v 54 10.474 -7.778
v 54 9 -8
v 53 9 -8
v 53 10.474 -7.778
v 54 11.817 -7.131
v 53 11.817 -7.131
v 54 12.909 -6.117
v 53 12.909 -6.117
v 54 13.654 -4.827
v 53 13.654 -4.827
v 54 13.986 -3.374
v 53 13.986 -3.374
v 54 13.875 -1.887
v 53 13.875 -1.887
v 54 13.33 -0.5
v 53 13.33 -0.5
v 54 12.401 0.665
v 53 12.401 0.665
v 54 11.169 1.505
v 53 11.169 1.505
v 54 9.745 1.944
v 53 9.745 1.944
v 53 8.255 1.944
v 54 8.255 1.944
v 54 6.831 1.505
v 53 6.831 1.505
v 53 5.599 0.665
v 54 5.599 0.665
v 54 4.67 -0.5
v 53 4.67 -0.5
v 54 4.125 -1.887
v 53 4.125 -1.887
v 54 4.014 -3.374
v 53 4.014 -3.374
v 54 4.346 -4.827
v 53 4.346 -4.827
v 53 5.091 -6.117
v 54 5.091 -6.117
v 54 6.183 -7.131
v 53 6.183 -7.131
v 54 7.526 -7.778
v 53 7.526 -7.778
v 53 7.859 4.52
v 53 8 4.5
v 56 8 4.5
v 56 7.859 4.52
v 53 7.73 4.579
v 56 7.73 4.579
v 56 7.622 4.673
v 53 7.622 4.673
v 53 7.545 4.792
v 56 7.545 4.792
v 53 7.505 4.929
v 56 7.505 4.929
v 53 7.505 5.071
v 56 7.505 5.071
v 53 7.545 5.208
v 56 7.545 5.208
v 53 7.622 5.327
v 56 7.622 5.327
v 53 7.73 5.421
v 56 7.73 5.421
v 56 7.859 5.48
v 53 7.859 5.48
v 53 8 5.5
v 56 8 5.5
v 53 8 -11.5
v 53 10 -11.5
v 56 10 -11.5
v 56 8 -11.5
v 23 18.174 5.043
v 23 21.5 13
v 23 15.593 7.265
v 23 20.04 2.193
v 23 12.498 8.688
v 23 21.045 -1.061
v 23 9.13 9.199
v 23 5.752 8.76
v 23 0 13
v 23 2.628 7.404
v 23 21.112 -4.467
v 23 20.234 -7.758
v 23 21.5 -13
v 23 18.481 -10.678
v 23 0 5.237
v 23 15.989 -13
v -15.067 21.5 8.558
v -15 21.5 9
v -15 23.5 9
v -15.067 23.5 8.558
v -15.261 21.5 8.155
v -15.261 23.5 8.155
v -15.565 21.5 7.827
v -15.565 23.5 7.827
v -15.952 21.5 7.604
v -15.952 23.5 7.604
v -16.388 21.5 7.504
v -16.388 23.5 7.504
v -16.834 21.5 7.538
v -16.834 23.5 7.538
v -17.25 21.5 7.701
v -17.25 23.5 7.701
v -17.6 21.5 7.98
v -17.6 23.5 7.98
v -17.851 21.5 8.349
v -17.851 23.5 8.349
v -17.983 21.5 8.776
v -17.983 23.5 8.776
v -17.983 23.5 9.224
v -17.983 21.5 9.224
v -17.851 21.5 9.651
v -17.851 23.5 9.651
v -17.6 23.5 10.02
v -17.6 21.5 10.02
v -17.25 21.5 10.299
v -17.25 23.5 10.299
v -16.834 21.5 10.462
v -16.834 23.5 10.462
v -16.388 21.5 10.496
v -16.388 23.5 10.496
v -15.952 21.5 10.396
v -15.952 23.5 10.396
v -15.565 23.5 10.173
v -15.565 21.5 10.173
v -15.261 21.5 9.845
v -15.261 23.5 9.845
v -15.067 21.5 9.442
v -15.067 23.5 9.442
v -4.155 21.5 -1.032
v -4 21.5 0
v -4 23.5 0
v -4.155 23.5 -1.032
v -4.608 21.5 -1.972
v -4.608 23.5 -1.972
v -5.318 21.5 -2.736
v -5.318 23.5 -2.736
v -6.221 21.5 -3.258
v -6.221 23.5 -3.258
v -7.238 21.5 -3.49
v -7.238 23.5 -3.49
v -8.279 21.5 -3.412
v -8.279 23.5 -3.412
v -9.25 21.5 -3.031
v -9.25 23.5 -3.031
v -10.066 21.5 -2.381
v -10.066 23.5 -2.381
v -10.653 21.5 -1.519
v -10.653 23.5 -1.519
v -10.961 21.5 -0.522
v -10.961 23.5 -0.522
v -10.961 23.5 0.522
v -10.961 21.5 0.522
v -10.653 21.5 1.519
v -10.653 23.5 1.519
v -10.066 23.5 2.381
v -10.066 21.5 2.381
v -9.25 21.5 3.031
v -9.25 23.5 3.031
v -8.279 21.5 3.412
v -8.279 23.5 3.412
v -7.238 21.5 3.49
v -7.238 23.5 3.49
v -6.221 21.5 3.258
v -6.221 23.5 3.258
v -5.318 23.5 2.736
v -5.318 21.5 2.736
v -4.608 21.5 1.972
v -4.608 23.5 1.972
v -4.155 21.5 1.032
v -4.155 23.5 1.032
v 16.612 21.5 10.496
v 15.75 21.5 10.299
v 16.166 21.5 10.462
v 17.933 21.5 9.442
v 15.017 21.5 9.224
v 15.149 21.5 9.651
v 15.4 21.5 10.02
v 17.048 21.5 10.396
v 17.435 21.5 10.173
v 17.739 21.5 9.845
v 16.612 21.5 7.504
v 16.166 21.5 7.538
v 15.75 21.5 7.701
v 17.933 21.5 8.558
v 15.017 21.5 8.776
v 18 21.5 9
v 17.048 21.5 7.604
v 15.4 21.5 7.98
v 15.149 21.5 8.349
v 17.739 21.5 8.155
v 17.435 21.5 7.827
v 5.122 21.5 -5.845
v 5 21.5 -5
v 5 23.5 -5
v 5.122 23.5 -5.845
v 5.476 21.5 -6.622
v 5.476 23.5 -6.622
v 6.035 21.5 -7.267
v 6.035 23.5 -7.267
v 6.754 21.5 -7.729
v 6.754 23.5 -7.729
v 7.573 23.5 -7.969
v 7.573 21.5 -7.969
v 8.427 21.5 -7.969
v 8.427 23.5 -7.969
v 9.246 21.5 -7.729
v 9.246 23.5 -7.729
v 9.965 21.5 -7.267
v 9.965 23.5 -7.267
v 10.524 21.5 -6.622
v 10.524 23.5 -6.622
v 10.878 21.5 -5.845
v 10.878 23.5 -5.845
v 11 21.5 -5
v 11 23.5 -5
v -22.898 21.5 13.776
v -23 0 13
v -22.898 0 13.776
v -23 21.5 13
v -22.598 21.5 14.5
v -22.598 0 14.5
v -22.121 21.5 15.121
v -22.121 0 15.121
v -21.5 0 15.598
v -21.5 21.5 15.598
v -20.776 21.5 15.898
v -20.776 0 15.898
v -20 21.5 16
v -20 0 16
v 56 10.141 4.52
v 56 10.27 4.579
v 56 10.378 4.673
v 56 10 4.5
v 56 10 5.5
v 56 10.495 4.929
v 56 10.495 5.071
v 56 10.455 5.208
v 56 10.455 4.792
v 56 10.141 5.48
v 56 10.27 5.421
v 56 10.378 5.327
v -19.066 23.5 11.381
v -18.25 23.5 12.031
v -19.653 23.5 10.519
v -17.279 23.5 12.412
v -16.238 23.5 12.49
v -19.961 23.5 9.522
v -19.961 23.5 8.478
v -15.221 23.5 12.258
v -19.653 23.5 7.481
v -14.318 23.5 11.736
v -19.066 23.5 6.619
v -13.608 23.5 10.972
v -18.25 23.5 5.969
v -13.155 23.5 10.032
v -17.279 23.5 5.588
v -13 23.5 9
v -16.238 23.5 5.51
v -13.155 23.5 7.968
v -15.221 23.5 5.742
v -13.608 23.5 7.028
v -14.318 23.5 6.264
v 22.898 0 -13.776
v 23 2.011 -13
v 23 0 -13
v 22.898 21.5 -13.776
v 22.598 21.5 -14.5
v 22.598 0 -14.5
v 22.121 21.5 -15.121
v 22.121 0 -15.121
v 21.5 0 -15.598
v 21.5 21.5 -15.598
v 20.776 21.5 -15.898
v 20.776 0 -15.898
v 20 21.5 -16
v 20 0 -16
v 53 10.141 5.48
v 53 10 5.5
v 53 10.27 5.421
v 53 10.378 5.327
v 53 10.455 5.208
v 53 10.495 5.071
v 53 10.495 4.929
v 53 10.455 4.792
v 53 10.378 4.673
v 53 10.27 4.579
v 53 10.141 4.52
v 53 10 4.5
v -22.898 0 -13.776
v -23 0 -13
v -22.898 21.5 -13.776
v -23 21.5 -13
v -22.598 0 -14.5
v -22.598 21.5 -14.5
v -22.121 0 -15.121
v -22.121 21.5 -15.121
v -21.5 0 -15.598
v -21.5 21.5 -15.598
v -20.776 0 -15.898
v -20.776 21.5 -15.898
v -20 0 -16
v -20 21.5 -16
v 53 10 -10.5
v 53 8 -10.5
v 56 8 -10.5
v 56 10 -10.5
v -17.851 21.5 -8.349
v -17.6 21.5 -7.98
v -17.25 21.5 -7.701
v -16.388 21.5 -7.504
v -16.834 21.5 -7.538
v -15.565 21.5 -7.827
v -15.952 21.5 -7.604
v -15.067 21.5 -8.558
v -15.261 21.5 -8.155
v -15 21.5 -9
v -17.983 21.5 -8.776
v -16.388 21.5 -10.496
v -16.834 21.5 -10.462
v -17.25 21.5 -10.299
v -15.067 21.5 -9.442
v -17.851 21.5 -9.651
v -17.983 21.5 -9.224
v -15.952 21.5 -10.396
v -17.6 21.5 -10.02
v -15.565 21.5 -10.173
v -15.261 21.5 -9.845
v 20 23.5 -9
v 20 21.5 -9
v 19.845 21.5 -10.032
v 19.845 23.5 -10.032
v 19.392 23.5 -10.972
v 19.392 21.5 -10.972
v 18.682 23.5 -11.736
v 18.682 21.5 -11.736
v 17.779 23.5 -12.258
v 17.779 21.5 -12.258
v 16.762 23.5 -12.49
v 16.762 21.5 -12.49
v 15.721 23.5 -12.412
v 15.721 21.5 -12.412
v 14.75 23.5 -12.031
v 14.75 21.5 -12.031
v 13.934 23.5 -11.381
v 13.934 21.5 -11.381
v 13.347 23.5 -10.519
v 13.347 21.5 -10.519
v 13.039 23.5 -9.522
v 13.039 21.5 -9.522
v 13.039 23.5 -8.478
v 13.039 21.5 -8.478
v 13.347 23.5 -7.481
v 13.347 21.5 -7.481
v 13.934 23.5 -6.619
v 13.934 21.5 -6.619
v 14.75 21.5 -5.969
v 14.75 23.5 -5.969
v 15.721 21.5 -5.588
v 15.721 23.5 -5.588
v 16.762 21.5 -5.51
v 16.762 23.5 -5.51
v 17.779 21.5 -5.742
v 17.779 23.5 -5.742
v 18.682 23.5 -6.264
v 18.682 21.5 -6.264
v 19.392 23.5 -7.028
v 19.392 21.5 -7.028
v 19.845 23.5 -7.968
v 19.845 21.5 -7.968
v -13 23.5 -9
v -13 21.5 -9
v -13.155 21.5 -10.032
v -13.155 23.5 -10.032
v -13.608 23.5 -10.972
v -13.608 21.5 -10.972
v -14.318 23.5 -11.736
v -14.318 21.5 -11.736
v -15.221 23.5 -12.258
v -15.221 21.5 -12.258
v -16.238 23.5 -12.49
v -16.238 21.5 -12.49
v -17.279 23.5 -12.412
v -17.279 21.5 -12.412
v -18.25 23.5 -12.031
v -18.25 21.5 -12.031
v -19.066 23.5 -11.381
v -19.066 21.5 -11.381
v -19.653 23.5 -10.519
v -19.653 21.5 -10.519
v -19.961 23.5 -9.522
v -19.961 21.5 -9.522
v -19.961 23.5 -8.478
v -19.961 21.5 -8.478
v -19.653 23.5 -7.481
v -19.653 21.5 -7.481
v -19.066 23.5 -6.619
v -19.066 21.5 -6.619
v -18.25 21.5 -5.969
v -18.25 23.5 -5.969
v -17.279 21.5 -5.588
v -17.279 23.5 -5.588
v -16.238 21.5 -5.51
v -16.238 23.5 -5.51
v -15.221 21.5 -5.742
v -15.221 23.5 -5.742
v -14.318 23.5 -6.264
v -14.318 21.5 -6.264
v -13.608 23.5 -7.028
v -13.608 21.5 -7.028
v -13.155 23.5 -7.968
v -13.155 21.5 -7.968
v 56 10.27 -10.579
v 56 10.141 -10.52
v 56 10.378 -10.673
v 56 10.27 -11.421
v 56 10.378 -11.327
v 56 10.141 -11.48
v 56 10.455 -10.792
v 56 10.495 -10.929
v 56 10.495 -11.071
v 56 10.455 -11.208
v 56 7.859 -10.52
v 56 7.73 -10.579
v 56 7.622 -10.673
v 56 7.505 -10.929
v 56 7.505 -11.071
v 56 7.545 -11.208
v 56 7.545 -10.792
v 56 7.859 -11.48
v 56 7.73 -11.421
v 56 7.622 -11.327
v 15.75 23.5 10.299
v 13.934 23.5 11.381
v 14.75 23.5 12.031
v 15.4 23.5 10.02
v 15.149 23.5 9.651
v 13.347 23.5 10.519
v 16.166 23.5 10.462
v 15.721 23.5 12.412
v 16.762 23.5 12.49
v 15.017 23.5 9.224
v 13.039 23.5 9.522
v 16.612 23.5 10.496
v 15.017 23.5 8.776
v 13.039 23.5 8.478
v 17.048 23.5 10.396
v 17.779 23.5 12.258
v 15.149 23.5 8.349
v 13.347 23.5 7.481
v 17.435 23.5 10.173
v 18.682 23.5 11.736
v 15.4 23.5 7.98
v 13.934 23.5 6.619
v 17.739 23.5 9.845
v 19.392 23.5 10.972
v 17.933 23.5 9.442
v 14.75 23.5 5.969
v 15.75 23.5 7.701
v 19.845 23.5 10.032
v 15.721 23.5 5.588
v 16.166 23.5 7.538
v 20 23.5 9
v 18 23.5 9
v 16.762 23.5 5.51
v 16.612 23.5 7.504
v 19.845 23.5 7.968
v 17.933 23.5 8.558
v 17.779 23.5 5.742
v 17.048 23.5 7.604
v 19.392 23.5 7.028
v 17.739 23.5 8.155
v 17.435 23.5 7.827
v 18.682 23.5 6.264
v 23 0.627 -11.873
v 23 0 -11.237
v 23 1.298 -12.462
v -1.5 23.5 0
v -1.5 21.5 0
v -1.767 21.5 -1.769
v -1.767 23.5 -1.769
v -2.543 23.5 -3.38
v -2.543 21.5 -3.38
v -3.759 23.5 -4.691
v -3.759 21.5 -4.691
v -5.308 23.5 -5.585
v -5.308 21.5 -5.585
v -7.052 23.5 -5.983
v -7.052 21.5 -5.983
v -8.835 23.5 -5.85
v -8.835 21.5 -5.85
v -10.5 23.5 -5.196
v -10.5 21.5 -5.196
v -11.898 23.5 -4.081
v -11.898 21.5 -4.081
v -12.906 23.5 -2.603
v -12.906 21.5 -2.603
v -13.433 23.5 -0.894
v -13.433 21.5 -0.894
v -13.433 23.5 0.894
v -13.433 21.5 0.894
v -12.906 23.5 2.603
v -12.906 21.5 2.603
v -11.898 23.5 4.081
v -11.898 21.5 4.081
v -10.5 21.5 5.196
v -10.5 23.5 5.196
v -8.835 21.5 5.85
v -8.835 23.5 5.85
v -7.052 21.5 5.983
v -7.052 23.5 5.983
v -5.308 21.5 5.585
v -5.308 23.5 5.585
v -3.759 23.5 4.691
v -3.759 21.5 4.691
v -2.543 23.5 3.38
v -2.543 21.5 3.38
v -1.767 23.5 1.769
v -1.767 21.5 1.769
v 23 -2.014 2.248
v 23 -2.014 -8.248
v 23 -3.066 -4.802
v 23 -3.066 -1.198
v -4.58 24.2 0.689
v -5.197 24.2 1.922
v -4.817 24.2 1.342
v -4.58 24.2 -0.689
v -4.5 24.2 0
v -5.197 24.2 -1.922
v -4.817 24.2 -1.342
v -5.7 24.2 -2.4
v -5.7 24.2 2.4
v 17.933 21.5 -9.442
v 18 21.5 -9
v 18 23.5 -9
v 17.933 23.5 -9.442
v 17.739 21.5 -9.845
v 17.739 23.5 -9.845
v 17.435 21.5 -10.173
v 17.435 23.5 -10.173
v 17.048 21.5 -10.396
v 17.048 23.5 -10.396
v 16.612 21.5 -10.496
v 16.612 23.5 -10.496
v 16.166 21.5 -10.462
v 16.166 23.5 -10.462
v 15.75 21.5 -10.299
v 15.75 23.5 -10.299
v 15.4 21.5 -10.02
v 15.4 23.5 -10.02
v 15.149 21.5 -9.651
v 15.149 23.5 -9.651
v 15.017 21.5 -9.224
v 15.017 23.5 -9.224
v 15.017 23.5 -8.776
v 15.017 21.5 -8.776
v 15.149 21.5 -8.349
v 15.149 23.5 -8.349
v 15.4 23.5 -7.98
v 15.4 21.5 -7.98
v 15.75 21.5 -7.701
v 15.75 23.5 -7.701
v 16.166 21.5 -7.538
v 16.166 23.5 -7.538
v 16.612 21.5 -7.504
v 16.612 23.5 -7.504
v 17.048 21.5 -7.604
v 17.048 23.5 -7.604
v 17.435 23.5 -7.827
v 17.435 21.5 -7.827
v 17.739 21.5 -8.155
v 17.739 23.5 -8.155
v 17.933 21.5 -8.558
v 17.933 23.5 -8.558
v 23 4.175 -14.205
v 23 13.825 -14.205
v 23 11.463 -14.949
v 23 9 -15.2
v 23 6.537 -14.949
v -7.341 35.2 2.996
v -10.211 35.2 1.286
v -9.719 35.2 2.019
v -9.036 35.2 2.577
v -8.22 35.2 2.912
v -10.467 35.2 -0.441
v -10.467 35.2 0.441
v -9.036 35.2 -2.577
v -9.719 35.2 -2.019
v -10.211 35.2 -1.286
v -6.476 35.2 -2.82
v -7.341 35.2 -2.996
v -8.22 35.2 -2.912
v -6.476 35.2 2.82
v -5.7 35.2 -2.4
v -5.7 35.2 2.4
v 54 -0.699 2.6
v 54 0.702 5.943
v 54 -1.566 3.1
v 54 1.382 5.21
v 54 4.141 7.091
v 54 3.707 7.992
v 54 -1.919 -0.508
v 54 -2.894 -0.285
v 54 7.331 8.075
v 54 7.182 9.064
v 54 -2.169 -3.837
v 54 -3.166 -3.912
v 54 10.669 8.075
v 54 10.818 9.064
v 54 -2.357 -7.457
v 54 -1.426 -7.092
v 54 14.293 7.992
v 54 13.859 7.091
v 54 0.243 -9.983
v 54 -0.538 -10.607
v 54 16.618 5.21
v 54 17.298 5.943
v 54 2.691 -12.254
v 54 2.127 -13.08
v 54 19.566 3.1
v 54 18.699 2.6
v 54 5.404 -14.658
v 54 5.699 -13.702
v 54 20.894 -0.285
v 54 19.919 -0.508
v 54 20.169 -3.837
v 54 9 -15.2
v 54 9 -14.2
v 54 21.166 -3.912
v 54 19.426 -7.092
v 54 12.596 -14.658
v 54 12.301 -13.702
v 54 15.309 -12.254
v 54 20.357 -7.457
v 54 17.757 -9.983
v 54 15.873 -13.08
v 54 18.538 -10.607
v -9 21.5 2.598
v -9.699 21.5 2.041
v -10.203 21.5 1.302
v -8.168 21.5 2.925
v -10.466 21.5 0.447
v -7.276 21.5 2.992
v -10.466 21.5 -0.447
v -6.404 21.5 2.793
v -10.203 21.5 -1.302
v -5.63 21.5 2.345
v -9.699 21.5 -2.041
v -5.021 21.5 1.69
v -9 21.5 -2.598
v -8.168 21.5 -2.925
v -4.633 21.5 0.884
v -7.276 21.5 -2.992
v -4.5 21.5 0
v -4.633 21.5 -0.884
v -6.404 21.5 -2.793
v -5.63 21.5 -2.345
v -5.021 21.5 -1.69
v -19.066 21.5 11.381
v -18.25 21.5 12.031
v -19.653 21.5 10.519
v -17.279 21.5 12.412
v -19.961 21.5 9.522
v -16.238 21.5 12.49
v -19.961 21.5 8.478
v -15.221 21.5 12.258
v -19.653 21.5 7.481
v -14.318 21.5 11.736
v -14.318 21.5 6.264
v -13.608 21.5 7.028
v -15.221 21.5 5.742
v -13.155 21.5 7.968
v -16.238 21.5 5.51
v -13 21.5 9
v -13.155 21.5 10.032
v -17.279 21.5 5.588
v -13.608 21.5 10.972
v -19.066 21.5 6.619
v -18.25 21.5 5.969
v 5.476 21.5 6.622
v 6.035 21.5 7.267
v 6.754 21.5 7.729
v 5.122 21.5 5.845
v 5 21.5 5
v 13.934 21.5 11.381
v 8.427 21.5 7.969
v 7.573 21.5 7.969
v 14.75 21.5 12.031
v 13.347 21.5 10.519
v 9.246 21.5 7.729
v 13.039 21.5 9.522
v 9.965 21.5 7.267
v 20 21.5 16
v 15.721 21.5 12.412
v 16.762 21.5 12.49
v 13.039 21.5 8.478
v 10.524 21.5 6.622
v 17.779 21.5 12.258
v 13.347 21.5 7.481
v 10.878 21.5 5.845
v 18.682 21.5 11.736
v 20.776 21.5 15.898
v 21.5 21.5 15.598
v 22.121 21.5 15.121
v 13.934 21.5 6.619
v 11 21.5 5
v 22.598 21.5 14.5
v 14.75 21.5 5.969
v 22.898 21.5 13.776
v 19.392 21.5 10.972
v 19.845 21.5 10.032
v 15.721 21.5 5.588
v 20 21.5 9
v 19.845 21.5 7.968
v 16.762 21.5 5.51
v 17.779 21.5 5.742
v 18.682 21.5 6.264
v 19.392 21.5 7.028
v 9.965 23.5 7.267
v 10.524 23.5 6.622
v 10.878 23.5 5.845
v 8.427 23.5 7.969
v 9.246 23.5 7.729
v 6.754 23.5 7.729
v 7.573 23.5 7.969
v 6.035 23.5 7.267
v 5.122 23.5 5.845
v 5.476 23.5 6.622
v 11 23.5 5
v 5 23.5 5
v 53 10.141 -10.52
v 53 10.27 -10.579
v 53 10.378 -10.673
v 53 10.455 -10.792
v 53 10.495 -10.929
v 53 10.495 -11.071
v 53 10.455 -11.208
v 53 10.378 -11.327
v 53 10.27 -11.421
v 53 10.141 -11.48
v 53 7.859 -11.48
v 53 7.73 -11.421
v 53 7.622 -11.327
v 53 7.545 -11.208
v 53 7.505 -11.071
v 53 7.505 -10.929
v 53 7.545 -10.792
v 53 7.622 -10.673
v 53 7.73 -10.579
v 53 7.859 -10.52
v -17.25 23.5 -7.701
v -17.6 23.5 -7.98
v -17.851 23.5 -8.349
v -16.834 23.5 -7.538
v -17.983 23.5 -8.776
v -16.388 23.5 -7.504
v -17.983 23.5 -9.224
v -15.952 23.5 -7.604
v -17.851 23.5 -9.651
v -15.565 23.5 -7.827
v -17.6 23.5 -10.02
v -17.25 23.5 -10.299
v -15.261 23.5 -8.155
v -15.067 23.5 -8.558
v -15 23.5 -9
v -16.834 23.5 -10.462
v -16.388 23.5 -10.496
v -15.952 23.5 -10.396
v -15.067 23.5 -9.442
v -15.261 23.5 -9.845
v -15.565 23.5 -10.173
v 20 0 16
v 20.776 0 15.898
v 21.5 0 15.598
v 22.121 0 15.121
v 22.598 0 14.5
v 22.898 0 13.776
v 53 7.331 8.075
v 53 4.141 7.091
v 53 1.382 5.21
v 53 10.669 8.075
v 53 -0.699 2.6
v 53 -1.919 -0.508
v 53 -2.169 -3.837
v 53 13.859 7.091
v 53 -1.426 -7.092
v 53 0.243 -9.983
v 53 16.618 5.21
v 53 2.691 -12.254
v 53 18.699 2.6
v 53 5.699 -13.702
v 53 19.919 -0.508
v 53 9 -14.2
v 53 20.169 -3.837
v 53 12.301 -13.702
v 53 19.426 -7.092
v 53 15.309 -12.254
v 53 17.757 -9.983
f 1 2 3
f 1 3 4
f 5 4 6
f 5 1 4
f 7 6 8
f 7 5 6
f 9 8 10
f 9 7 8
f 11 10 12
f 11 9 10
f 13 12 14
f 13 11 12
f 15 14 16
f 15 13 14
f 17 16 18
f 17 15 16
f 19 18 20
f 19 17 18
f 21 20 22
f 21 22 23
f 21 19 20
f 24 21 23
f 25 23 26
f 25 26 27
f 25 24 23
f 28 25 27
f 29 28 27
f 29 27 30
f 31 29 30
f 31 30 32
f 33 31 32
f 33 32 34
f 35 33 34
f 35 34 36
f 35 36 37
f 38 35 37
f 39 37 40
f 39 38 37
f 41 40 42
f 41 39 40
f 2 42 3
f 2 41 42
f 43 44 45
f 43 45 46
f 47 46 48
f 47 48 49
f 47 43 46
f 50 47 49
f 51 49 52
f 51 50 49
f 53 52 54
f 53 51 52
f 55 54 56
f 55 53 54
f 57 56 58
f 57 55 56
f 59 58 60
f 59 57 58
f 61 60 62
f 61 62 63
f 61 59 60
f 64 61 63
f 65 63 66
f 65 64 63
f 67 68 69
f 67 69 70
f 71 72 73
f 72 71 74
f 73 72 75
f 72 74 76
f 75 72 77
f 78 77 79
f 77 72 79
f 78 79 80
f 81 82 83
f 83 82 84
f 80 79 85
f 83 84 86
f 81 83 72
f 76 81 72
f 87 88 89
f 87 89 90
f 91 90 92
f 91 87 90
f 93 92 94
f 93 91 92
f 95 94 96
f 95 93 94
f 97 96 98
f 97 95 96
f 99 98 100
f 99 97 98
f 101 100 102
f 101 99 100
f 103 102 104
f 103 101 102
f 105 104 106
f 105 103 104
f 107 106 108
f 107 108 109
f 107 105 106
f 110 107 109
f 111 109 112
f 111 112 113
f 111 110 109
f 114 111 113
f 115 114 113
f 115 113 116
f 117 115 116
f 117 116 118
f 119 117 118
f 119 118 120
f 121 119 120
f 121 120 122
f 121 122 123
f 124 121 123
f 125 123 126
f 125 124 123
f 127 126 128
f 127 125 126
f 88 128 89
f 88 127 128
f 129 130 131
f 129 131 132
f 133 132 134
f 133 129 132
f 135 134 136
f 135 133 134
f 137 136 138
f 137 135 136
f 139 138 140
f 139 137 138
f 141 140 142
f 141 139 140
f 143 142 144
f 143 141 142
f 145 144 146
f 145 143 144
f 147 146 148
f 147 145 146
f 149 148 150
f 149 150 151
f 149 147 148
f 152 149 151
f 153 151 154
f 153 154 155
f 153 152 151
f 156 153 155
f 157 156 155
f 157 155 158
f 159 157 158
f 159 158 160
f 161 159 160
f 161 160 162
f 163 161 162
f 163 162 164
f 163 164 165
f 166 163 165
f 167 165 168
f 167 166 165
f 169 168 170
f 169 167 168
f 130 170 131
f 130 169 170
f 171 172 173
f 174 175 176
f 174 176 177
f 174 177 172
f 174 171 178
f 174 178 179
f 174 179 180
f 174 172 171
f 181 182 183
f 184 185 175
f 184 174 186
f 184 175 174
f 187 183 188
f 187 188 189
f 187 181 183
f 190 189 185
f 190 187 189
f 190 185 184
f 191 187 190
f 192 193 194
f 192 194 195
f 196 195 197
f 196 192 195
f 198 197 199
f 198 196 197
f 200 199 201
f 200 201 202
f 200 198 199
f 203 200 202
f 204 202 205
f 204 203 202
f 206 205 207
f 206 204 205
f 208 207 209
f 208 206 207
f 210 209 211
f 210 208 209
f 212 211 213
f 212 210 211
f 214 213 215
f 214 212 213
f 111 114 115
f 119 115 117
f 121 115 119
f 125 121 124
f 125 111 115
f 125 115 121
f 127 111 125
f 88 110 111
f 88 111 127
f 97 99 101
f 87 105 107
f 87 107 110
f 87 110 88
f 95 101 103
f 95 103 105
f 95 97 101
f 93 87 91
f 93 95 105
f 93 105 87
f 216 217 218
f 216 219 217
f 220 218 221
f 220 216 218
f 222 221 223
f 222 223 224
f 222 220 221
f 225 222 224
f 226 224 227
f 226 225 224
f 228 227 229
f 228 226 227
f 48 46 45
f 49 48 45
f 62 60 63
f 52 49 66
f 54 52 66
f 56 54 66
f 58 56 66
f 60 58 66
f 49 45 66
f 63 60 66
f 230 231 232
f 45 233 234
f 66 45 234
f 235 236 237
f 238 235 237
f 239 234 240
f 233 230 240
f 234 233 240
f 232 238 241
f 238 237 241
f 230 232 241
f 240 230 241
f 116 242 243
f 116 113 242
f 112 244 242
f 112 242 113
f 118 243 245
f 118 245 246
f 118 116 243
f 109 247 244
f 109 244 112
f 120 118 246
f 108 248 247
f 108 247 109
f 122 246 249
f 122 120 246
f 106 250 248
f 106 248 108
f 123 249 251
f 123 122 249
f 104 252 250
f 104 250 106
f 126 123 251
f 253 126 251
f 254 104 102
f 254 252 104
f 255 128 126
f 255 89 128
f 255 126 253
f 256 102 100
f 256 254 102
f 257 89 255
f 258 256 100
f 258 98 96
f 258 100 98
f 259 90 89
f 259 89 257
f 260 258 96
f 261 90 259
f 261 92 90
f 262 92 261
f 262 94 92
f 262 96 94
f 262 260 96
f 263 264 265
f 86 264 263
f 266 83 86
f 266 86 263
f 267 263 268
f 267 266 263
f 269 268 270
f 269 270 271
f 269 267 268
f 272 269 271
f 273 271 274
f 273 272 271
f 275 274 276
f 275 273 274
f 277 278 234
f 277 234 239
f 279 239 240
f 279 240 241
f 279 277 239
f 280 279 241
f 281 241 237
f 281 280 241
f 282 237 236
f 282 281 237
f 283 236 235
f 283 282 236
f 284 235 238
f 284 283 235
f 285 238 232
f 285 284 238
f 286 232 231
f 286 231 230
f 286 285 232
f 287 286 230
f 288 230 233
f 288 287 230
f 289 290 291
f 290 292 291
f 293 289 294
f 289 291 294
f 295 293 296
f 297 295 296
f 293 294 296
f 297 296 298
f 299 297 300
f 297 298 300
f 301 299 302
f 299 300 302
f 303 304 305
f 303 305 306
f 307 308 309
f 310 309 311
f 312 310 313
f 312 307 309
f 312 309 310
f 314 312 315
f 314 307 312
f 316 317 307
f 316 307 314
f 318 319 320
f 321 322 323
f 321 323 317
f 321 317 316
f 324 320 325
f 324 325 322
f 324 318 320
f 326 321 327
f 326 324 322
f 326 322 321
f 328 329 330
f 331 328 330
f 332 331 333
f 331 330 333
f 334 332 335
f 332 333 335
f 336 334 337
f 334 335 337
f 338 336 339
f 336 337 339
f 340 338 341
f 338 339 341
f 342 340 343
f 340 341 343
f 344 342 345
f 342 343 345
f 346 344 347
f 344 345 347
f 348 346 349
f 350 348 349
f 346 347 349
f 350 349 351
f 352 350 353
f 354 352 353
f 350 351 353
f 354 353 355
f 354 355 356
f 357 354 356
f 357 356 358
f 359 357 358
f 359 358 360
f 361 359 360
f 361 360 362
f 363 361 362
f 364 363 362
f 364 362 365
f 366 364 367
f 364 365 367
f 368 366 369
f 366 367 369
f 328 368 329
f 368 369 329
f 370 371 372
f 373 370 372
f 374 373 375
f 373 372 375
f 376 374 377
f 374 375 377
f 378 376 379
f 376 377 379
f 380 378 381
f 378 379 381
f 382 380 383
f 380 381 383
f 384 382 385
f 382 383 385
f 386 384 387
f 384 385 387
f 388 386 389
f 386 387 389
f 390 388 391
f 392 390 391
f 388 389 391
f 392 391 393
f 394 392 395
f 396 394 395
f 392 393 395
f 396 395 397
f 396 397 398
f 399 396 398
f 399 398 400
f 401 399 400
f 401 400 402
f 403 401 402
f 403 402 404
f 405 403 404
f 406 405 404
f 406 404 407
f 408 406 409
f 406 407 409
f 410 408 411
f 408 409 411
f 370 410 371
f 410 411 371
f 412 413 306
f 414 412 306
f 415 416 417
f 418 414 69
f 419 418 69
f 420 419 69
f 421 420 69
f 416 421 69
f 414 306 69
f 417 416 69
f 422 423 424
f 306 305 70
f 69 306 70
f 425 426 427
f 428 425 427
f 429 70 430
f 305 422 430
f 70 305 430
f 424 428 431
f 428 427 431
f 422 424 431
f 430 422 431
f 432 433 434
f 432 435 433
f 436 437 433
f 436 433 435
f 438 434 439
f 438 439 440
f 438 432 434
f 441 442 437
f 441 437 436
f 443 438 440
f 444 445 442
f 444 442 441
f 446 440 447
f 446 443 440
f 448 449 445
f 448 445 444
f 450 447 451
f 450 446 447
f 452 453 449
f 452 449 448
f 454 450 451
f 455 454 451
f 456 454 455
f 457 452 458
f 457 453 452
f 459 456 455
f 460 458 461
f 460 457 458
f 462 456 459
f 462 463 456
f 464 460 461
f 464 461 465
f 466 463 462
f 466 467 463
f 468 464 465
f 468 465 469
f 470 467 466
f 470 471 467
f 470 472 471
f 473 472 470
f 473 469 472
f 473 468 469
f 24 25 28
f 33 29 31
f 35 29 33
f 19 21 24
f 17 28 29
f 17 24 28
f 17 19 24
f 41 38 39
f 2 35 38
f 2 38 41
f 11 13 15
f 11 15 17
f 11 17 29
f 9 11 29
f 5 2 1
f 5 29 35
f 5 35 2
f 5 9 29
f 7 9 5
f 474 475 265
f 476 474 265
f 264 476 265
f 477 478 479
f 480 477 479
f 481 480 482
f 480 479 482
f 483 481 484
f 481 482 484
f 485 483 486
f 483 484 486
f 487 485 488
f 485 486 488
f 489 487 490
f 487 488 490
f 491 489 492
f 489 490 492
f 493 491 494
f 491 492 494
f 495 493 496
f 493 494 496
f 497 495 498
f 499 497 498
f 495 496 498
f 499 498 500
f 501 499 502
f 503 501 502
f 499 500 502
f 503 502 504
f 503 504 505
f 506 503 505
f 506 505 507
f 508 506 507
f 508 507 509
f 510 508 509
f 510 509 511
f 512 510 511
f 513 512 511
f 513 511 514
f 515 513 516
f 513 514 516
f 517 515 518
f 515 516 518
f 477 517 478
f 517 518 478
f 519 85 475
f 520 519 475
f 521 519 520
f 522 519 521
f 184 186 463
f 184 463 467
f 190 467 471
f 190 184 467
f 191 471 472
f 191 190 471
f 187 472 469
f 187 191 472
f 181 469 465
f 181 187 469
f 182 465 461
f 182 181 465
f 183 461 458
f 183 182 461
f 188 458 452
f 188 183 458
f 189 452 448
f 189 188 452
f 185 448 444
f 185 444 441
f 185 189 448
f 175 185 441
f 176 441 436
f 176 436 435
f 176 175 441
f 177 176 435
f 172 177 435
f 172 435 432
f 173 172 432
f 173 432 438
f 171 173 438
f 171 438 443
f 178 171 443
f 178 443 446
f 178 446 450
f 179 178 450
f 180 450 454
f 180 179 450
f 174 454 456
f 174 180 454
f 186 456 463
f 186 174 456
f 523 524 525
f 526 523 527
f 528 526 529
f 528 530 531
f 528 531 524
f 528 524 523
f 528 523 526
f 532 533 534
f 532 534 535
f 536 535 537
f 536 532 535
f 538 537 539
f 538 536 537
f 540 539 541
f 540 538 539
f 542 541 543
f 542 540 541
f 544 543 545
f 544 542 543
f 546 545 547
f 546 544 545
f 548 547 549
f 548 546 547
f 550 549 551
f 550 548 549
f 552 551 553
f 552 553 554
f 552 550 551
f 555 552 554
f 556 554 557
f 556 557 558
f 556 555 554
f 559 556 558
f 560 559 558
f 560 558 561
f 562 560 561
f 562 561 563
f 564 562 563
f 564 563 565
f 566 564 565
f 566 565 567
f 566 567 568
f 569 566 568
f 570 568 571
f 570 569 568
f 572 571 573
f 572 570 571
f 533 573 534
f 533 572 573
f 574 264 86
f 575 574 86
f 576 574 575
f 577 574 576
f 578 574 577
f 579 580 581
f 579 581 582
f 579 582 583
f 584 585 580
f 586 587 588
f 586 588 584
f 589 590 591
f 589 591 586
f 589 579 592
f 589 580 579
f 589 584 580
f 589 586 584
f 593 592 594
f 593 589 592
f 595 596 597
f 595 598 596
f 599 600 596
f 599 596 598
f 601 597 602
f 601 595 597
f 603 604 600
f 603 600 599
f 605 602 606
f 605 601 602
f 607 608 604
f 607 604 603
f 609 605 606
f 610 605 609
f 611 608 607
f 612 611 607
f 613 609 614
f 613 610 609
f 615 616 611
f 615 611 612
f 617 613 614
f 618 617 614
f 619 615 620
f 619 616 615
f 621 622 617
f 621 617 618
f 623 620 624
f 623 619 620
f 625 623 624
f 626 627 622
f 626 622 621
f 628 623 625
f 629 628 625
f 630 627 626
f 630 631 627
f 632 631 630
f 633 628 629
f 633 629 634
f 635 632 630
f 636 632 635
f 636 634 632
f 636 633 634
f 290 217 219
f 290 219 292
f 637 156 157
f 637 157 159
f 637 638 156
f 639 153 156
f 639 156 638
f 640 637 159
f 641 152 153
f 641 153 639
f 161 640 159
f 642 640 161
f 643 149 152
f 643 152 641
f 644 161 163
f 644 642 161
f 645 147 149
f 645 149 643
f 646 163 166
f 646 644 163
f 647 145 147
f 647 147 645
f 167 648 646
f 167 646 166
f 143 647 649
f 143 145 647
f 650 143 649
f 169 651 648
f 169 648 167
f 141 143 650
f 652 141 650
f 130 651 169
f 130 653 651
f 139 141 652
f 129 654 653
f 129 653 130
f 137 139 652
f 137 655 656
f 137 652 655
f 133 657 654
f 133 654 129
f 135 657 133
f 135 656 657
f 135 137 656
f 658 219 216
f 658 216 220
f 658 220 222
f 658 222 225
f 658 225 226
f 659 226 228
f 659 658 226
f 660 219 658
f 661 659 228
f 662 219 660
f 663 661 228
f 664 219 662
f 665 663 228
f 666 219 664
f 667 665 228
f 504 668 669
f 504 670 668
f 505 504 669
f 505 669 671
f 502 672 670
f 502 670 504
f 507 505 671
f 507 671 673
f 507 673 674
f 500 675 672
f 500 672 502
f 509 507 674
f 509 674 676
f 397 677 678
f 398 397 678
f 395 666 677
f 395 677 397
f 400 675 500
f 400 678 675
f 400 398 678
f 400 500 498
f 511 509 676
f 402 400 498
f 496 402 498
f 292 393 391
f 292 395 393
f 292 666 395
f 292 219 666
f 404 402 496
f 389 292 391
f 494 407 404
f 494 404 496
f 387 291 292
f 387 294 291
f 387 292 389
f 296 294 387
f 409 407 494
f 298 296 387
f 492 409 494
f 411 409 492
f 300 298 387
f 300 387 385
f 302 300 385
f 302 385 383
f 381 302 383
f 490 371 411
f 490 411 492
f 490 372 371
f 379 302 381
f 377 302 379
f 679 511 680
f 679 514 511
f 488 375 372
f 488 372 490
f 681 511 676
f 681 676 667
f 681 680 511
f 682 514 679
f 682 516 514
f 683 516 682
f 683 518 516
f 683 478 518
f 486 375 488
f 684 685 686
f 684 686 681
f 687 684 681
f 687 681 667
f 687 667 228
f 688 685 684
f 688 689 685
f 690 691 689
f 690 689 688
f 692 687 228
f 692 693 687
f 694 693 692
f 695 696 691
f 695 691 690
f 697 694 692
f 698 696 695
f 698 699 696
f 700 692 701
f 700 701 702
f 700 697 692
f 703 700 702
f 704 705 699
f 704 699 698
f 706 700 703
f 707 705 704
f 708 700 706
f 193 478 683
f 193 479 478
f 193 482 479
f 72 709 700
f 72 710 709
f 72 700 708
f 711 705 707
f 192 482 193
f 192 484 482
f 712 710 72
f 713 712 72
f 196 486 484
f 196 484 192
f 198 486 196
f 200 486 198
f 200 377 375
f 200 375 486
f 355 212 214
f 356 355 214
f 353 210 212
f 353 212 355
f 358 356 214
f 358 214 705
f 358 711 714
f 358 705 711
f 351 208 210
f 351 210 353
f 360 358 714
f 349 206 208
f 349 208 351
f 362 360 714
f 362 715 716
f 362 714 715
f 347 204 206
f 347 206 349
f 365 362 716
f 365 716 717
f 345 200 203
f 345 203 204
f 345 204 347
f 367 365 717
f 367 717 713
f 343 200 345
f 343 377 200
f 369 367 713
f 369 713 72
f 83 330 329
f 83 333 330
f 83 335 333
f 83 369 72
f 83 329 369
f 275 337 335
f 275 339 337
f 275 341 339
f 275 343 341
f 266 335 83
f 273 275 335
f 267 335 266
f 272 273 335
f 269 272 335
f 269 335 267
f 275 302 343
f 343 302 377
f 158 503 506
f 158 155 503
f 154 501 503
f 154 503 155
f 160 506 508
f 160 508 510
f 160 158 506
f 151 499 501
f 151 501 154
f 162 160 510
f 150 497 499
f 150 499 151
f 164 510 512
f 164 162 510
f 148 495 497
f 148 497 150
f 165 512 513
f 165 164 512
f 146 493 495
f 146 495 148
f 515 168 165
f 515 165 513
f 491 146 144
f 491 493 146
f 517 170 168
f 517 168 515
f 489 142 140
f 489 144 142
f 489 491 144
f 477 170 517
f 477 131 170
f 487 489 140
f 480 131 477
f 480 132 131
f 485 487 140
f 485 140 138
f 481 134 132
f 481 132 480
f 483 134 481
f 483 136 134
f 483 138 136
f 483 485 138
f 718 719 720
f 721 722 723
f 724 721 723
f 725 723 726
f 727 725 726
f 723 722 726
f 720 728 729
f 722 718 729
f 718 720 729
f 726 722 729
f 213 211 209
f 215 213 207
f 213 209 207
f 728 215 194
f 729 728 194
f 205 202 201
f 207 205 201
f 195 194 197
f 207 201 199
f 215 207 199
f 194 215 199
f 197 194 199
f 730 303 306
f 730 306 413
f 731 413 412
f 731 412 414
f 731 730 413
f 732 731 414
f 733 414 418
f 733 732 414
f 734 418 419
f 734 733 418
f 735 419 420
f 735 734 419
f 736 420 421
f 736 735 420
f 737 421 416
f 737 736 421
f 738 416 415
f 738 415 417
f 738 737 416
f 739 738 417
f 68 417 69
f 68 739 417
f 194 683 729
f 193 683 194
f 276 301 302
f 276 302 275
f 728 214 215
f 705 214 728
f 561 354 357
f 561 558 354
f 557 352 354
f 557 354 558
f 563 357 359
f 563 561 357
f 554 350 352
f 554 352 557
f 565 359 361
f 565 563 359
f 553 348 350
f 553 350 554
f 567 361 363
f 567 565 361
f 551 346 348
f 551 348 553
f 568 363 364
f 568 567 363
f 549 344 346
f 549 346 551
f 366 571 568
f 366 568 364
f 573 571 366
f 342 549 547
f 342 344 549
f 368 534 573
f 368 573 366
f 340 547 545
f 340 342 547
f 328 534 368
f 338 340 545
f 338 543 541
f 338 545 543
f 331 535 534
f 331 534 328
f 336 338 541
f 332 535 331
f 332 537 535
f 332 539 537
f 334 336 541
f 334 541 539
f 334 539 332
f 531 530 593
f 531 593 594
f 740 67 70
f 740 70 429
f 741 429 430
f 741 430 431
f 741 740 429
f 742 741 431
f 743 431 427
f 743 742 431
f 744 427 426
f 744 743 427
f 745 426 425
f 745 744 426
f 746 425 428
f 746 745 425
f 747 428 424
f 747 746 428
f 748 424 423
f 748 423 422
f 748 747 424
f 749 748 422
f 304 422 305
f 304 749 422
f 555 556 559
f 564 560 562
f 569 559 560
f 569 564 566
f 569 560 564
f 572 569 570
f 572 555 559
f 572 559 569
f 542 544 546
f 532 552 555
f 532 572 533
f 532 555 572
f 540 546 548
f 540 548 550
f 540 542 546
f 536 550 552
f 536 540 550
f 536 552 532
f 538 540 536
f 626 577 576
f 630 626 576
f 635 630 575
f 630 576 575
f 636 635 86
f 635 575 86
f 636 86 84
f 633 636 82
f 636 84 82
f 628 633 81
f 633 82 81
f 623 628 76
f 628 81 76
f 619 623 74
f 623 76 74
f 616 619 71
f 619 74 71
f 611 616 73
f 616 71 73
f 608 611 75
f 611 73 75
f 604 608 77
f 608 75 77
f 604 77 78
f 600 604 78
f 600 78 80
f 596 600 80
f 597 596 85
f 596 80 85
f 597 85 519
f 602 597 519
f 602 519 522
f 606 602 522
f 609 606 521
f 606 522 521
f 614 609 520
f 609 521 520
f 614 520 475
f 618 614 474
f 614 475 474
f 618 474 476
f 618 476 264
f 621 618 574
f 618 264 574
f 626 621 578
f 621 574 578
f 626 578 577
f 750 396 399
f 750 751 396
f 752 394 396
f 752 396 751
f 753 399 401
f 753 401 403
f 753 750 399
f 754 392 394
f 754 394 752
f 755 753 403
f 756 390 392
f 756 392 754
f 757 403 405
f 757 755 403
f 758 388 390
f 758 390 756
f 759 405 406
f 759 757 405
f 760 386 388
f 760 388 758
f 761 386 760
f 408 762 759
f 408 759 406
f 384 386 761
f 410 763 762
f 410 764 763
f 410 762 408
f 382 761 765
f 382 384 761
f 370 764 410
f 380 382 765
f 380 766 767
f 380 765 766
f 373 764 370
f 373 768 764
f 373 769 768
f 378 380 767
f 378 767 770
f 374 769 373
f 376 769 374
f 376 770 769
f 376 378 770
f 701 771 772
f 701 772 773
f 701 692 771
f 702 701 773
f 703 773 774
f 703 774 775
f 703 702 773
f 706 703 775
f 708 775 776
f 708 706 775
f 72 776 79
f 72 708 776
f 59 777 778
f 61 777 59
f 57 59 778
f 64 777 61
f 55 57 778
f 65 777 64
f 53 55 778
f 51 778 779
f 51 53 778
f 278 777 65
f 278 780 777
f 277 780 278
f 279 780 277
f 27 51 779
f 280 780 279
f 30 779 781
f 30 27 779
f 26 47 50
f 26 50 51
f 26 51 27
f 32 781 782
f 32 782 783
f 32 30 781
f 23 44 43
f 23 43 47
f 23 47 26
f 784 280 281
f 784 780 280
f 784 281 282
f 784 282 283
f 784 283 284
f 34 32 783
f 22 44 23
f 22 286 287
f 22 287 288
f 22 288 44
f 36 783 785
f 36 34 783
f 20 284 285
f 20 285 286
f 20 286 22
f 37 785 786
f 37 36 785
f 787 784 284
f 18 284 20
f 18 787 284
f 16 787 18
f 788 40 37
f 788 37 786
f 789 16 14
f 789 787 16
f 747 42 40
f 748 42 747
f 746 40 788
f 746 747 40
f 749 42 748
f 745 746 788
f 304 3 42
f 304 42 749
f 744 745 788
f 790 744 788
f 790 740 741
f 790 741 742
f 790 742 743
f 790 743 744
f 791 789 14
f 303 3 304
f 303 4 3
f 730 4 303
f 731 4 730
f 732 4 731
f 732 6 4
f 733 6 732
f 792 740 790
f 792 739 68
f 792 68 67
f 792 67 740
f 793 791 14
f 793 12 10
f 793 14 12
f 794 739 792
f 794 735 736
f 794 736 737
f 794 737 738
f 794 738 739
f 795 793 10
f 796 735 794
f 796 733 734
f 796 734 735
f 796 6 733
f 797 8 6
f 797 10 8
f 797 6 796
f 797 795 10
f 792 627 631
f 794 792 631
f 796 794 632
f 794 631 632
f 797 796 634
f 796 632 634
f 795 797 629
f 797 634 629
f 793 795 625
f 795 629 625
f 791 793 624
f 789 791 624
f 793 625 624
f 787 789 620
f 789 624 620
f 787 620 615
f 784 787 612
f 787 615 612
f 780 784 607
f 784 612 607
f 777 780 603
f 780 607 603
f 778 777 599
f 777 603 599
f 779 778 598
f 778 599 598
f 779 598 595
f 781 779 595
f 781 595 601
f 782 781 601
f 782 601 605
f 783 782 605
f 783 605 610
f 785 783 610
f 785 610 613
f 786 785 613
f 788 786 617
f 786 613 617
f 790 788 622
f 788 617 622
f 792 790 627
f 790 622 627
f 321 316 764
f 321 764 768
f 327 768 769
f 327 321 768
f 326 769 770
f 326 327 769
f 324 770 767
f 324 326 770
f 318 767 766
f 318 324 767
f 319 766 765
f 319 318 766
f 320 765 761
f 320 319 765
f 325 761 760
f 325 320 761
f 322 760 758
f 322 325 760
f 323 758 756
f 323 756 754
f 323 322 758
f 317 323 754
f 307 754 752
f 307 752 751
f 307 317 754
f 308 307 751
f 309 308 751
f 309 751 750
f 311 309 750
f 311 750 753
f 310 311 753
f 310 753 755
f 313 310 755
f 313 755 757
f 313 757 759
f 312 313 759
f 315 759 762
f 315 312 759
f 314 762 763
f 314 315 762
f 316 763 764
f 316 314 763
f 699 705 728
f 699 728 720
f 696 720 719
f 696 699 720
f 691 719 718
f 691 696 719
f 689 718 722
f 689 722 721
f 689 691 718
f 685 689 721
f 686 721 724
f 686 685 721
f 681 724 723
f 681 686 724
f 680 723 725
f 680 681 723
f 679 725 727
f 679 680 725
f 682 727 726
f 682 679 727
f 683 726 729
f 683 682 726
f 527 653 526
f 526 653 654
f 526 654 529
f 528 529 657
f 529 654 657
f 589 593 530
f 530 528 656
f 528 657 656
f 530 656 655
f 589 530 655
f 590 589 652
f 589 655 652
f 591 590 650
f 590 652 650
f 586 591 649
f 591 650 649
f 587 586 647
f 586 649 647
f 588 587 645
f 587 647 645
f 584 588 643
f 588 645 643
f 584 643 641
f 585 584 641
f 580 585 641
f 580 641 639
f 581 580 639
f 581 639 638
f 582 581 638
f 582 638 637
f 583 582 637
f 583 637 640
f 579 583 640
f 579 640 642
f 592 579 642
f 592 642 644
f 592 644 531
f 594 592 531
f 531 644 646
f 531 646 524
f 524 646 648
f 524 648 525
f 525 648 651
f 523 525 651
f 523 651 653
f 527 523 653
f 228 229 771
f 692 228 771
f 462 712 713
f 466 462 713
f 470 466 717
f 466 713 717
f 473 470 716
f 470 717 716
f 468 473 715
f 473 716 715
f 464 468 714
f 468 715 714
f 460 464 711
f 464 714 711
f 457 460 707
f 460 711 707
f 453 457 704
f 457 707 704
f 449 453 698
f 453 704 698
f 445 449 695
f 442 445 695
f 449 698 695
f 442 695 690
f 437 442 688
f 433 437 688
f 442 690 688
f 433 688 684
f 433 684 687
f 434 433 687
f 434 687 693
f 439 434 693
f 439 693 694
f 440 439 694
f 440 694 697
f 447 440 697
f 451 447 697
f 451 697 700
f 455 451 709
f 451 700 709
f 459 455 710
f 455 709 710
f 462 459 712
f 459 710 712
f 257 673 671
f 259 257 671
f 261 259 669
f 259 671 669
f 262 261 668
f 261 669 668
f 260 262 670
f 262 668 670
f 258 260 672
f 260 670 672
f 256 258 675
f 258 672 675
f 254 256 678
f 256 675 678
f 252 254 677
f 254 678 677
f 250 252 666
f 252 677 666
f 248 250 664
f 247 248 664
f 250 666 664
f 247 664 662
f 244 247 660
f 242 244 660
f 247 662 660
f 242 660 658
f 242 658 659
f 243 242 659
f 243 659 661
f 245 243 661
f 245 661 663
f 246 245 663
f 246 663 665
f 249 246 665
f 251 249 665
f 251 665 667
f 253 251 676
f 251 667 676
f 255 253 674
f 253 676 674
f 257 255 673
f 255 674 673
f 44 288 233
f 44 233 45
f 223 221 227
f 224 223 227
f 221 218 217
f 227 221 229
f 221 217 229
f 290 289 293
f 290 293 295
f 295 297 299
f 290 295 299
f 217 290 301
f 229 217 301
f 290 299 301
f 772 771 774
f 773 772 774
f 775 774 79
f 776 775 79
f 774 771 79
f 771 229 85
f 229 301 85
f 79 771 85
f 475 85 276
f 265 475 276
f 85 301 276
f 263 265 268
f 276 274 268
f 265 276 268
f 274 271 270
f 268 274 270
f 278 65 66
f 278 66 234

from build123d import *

# Parameters (mm, degrees)
SKETCH1_W           = 46
SKETCH1_H           = 32
BOSS_EXTRUDE1_DEPTH = 21.5
FILLET1_R           = 3
SKETCH2_R           = 3.5
SKETCH2_R_2         = 1.5
SKETCH2_R_3         = 6
BOSS_EXTRUDE2_DEPTH = 2
SKETCH3_R           = 3
BOSS_EXTRUDE3_DEPTH = 13.7
CUT_EXTRUDE1_DEPTH  = 11
SKETCH6_R           = 12.2
BOSS_EXTRUDE5_DEPTH = 31
SKETCH7_R           = 11.2
SKETCH7_R_2         = 5
CUT_EXTRUDE2_DEPTH  = 1
BOSS_EXTRUDE6_DEPTH = 3
CIRPATTERN1_COUNT   = 2


with BuildPart() as part:
    # Sketch1 → Boss-Extrude1 (new body)
    with BuildSketch(Plane(origin=(0, 0, 0), x_dir=(1, 0, 0), z_dir=(0, 1, 0))):
        Rectangle(SKETCH1_W, SKETCH1_H)
    extrude(amount=BOSS_EXTRUDE1_DEPTH)

    # Fillet1
    fillet1_edges = [part.edges().sort_by_distance(p)[0] for p in [
        (23, 10.75, 16),
        (-23, 10.75, 16),
        (-23, 10.75, -16),
        (23, 10.75, -16),
    ]]
    fillet(fillet1_edges, radius=FILLET1_R)

    # Sketch2 → Boss-Extrude2 (add)
    with BuildSketch(Plane(origin=(0, 21.5, 0), x_dir=(1, 0, 0), z_dir=(0, 1, 0))):
        with Locations((-16.5, 9)):
            Circle(SKETCH2_R)
        with Locations((-16.5, 9)):
            Circle(SKETCH2_R_2, mode=Mode.SUBTRACT)
        with Locations((16.5, 9)):
            Circle(SKETCH2_R)
        with Locations((16.5, 9)):
            Circle(SKETCH2_R_2, mode=Mode.SUBTRACT)
        with Locations((16.5, -9)):
            Circle(SKETCH2_R)
        with Locations((16.5, -9)):
            Circle(SKETCH2_R_2, mode=Mode.SUBTRACT)
        with Locations((-16.5, -9)):
            Circle(SKETCH2_R)
        with Locations((-16.5, -9)):
            Circle(SKETCH2_R_2, mode=Mode.SUBTRACT)
        with Locations((-7.5, 0)):
            Circle(SKETCH2_R_3)
        with Locations((-7.5, 0)):
            Circle(SKETCH2_R, mode=Mode.SUBTRACT)
        with BuildLine():
            Line((11, 5), (11, -5))
            ThreePointArc((11, -5), (8, -8), (5, -5))
            Line((5, -5), (5, 5))
            ThreePointArc((5, 5), (8, 8), (11, 5))
        make_face()
    extrude(amount=BOSS_EXTRUDE2_DEPTH)

    # Sketch3 → Boss-Extrude3 (add)
    with BuildSketch(Plane(origin=(0, 21.5, 0), x_dir=(1, 0, 0), z_dir=(0, 1, 0))):
        with Locations((-7.5, 0)):
            Circle(SKETCH3_R)
    extrude(amount=BOSS_EXTRUDE3_DEPTH)

    # Sketch4 → Cut-Extrude1 (cut)
    with BuildSketch(Plane(origin=(0, 35.2, 0), x_dir=(1, 0, 0), z_dir=(0, 1, 0))):
        Polygon((-5.7, 80.583575735), (-5.7, 2.4), (-5.7, -2.4), (-5.7, -80.583575735), (150.66715147, -80.583575735), (150.66715147, 80.583575735), align=None)
    extrude(amount=-CUT_EXTRUDE1_DEPTH, mode=Mode.SUBTRACT)

    # Sketch6 → Boss-Extrude5 (add)
    with BuildSketch(Plane(origin=(23, 0, 0), x_dir=(0, 0, -1), z_dir=(1, 0, 0))):
        with Locations((3, 9)):
            Circle(SKETCH6_R)
    extrude(amount=BOSS_EXTRUDE5_DEPTH)

    # Sketch7 → Cut-Extrude2 (cut)
    with BuildSketch(Plane(origin=(54, 0, 0), x_dir=(0, 0, -1), z_dir=(1, 0, 0))):
        with Locations((3, 9)):
            Circle(SKETCH7_R)
        with Locations((3, 9)):
            Circle(SKETCH7_R_2, mode=Mode.SUBTRACT)
    extrude(amount=-CUT_EXTRUDE2_DEPTH, mode=Mode.SUBTRACT)

    # Sketch8 → Boss-Extrude6 (add)
    with BuildSketch(Plane(origin=(53, 0, 0), x_dir=(0, 0, -1), z_dir=(1, 0, 0))):
        with BuildLine():
            Line((-5.5, 8), (-5.5, 10))
            ThreePointArc((-5.5, 10), (-5, 10.5), (-4.5, 10))
            Line((-4.5, 10), (-4.5, 8))
            ThreePointArc((-4.5, 8), (-5, 7.5), (-5.5, 8))
        make_face()
    boss_extrude6 = extrude(amount=BOSS_EXTRUDE6_DEPTH)

    # CirPattern1: Boss-Extrude6 ×2 about axis
    cirpattern1_axis = Axis((0, 9, -3), (1, 0, 0))
    for i in range(1, CIRPATTERN1_COUNT):
        add(boss_extrude6.rotate(cirpattern1_axis, i * 360 / CIRPATTERN1_COUNT))


solid = part.part
